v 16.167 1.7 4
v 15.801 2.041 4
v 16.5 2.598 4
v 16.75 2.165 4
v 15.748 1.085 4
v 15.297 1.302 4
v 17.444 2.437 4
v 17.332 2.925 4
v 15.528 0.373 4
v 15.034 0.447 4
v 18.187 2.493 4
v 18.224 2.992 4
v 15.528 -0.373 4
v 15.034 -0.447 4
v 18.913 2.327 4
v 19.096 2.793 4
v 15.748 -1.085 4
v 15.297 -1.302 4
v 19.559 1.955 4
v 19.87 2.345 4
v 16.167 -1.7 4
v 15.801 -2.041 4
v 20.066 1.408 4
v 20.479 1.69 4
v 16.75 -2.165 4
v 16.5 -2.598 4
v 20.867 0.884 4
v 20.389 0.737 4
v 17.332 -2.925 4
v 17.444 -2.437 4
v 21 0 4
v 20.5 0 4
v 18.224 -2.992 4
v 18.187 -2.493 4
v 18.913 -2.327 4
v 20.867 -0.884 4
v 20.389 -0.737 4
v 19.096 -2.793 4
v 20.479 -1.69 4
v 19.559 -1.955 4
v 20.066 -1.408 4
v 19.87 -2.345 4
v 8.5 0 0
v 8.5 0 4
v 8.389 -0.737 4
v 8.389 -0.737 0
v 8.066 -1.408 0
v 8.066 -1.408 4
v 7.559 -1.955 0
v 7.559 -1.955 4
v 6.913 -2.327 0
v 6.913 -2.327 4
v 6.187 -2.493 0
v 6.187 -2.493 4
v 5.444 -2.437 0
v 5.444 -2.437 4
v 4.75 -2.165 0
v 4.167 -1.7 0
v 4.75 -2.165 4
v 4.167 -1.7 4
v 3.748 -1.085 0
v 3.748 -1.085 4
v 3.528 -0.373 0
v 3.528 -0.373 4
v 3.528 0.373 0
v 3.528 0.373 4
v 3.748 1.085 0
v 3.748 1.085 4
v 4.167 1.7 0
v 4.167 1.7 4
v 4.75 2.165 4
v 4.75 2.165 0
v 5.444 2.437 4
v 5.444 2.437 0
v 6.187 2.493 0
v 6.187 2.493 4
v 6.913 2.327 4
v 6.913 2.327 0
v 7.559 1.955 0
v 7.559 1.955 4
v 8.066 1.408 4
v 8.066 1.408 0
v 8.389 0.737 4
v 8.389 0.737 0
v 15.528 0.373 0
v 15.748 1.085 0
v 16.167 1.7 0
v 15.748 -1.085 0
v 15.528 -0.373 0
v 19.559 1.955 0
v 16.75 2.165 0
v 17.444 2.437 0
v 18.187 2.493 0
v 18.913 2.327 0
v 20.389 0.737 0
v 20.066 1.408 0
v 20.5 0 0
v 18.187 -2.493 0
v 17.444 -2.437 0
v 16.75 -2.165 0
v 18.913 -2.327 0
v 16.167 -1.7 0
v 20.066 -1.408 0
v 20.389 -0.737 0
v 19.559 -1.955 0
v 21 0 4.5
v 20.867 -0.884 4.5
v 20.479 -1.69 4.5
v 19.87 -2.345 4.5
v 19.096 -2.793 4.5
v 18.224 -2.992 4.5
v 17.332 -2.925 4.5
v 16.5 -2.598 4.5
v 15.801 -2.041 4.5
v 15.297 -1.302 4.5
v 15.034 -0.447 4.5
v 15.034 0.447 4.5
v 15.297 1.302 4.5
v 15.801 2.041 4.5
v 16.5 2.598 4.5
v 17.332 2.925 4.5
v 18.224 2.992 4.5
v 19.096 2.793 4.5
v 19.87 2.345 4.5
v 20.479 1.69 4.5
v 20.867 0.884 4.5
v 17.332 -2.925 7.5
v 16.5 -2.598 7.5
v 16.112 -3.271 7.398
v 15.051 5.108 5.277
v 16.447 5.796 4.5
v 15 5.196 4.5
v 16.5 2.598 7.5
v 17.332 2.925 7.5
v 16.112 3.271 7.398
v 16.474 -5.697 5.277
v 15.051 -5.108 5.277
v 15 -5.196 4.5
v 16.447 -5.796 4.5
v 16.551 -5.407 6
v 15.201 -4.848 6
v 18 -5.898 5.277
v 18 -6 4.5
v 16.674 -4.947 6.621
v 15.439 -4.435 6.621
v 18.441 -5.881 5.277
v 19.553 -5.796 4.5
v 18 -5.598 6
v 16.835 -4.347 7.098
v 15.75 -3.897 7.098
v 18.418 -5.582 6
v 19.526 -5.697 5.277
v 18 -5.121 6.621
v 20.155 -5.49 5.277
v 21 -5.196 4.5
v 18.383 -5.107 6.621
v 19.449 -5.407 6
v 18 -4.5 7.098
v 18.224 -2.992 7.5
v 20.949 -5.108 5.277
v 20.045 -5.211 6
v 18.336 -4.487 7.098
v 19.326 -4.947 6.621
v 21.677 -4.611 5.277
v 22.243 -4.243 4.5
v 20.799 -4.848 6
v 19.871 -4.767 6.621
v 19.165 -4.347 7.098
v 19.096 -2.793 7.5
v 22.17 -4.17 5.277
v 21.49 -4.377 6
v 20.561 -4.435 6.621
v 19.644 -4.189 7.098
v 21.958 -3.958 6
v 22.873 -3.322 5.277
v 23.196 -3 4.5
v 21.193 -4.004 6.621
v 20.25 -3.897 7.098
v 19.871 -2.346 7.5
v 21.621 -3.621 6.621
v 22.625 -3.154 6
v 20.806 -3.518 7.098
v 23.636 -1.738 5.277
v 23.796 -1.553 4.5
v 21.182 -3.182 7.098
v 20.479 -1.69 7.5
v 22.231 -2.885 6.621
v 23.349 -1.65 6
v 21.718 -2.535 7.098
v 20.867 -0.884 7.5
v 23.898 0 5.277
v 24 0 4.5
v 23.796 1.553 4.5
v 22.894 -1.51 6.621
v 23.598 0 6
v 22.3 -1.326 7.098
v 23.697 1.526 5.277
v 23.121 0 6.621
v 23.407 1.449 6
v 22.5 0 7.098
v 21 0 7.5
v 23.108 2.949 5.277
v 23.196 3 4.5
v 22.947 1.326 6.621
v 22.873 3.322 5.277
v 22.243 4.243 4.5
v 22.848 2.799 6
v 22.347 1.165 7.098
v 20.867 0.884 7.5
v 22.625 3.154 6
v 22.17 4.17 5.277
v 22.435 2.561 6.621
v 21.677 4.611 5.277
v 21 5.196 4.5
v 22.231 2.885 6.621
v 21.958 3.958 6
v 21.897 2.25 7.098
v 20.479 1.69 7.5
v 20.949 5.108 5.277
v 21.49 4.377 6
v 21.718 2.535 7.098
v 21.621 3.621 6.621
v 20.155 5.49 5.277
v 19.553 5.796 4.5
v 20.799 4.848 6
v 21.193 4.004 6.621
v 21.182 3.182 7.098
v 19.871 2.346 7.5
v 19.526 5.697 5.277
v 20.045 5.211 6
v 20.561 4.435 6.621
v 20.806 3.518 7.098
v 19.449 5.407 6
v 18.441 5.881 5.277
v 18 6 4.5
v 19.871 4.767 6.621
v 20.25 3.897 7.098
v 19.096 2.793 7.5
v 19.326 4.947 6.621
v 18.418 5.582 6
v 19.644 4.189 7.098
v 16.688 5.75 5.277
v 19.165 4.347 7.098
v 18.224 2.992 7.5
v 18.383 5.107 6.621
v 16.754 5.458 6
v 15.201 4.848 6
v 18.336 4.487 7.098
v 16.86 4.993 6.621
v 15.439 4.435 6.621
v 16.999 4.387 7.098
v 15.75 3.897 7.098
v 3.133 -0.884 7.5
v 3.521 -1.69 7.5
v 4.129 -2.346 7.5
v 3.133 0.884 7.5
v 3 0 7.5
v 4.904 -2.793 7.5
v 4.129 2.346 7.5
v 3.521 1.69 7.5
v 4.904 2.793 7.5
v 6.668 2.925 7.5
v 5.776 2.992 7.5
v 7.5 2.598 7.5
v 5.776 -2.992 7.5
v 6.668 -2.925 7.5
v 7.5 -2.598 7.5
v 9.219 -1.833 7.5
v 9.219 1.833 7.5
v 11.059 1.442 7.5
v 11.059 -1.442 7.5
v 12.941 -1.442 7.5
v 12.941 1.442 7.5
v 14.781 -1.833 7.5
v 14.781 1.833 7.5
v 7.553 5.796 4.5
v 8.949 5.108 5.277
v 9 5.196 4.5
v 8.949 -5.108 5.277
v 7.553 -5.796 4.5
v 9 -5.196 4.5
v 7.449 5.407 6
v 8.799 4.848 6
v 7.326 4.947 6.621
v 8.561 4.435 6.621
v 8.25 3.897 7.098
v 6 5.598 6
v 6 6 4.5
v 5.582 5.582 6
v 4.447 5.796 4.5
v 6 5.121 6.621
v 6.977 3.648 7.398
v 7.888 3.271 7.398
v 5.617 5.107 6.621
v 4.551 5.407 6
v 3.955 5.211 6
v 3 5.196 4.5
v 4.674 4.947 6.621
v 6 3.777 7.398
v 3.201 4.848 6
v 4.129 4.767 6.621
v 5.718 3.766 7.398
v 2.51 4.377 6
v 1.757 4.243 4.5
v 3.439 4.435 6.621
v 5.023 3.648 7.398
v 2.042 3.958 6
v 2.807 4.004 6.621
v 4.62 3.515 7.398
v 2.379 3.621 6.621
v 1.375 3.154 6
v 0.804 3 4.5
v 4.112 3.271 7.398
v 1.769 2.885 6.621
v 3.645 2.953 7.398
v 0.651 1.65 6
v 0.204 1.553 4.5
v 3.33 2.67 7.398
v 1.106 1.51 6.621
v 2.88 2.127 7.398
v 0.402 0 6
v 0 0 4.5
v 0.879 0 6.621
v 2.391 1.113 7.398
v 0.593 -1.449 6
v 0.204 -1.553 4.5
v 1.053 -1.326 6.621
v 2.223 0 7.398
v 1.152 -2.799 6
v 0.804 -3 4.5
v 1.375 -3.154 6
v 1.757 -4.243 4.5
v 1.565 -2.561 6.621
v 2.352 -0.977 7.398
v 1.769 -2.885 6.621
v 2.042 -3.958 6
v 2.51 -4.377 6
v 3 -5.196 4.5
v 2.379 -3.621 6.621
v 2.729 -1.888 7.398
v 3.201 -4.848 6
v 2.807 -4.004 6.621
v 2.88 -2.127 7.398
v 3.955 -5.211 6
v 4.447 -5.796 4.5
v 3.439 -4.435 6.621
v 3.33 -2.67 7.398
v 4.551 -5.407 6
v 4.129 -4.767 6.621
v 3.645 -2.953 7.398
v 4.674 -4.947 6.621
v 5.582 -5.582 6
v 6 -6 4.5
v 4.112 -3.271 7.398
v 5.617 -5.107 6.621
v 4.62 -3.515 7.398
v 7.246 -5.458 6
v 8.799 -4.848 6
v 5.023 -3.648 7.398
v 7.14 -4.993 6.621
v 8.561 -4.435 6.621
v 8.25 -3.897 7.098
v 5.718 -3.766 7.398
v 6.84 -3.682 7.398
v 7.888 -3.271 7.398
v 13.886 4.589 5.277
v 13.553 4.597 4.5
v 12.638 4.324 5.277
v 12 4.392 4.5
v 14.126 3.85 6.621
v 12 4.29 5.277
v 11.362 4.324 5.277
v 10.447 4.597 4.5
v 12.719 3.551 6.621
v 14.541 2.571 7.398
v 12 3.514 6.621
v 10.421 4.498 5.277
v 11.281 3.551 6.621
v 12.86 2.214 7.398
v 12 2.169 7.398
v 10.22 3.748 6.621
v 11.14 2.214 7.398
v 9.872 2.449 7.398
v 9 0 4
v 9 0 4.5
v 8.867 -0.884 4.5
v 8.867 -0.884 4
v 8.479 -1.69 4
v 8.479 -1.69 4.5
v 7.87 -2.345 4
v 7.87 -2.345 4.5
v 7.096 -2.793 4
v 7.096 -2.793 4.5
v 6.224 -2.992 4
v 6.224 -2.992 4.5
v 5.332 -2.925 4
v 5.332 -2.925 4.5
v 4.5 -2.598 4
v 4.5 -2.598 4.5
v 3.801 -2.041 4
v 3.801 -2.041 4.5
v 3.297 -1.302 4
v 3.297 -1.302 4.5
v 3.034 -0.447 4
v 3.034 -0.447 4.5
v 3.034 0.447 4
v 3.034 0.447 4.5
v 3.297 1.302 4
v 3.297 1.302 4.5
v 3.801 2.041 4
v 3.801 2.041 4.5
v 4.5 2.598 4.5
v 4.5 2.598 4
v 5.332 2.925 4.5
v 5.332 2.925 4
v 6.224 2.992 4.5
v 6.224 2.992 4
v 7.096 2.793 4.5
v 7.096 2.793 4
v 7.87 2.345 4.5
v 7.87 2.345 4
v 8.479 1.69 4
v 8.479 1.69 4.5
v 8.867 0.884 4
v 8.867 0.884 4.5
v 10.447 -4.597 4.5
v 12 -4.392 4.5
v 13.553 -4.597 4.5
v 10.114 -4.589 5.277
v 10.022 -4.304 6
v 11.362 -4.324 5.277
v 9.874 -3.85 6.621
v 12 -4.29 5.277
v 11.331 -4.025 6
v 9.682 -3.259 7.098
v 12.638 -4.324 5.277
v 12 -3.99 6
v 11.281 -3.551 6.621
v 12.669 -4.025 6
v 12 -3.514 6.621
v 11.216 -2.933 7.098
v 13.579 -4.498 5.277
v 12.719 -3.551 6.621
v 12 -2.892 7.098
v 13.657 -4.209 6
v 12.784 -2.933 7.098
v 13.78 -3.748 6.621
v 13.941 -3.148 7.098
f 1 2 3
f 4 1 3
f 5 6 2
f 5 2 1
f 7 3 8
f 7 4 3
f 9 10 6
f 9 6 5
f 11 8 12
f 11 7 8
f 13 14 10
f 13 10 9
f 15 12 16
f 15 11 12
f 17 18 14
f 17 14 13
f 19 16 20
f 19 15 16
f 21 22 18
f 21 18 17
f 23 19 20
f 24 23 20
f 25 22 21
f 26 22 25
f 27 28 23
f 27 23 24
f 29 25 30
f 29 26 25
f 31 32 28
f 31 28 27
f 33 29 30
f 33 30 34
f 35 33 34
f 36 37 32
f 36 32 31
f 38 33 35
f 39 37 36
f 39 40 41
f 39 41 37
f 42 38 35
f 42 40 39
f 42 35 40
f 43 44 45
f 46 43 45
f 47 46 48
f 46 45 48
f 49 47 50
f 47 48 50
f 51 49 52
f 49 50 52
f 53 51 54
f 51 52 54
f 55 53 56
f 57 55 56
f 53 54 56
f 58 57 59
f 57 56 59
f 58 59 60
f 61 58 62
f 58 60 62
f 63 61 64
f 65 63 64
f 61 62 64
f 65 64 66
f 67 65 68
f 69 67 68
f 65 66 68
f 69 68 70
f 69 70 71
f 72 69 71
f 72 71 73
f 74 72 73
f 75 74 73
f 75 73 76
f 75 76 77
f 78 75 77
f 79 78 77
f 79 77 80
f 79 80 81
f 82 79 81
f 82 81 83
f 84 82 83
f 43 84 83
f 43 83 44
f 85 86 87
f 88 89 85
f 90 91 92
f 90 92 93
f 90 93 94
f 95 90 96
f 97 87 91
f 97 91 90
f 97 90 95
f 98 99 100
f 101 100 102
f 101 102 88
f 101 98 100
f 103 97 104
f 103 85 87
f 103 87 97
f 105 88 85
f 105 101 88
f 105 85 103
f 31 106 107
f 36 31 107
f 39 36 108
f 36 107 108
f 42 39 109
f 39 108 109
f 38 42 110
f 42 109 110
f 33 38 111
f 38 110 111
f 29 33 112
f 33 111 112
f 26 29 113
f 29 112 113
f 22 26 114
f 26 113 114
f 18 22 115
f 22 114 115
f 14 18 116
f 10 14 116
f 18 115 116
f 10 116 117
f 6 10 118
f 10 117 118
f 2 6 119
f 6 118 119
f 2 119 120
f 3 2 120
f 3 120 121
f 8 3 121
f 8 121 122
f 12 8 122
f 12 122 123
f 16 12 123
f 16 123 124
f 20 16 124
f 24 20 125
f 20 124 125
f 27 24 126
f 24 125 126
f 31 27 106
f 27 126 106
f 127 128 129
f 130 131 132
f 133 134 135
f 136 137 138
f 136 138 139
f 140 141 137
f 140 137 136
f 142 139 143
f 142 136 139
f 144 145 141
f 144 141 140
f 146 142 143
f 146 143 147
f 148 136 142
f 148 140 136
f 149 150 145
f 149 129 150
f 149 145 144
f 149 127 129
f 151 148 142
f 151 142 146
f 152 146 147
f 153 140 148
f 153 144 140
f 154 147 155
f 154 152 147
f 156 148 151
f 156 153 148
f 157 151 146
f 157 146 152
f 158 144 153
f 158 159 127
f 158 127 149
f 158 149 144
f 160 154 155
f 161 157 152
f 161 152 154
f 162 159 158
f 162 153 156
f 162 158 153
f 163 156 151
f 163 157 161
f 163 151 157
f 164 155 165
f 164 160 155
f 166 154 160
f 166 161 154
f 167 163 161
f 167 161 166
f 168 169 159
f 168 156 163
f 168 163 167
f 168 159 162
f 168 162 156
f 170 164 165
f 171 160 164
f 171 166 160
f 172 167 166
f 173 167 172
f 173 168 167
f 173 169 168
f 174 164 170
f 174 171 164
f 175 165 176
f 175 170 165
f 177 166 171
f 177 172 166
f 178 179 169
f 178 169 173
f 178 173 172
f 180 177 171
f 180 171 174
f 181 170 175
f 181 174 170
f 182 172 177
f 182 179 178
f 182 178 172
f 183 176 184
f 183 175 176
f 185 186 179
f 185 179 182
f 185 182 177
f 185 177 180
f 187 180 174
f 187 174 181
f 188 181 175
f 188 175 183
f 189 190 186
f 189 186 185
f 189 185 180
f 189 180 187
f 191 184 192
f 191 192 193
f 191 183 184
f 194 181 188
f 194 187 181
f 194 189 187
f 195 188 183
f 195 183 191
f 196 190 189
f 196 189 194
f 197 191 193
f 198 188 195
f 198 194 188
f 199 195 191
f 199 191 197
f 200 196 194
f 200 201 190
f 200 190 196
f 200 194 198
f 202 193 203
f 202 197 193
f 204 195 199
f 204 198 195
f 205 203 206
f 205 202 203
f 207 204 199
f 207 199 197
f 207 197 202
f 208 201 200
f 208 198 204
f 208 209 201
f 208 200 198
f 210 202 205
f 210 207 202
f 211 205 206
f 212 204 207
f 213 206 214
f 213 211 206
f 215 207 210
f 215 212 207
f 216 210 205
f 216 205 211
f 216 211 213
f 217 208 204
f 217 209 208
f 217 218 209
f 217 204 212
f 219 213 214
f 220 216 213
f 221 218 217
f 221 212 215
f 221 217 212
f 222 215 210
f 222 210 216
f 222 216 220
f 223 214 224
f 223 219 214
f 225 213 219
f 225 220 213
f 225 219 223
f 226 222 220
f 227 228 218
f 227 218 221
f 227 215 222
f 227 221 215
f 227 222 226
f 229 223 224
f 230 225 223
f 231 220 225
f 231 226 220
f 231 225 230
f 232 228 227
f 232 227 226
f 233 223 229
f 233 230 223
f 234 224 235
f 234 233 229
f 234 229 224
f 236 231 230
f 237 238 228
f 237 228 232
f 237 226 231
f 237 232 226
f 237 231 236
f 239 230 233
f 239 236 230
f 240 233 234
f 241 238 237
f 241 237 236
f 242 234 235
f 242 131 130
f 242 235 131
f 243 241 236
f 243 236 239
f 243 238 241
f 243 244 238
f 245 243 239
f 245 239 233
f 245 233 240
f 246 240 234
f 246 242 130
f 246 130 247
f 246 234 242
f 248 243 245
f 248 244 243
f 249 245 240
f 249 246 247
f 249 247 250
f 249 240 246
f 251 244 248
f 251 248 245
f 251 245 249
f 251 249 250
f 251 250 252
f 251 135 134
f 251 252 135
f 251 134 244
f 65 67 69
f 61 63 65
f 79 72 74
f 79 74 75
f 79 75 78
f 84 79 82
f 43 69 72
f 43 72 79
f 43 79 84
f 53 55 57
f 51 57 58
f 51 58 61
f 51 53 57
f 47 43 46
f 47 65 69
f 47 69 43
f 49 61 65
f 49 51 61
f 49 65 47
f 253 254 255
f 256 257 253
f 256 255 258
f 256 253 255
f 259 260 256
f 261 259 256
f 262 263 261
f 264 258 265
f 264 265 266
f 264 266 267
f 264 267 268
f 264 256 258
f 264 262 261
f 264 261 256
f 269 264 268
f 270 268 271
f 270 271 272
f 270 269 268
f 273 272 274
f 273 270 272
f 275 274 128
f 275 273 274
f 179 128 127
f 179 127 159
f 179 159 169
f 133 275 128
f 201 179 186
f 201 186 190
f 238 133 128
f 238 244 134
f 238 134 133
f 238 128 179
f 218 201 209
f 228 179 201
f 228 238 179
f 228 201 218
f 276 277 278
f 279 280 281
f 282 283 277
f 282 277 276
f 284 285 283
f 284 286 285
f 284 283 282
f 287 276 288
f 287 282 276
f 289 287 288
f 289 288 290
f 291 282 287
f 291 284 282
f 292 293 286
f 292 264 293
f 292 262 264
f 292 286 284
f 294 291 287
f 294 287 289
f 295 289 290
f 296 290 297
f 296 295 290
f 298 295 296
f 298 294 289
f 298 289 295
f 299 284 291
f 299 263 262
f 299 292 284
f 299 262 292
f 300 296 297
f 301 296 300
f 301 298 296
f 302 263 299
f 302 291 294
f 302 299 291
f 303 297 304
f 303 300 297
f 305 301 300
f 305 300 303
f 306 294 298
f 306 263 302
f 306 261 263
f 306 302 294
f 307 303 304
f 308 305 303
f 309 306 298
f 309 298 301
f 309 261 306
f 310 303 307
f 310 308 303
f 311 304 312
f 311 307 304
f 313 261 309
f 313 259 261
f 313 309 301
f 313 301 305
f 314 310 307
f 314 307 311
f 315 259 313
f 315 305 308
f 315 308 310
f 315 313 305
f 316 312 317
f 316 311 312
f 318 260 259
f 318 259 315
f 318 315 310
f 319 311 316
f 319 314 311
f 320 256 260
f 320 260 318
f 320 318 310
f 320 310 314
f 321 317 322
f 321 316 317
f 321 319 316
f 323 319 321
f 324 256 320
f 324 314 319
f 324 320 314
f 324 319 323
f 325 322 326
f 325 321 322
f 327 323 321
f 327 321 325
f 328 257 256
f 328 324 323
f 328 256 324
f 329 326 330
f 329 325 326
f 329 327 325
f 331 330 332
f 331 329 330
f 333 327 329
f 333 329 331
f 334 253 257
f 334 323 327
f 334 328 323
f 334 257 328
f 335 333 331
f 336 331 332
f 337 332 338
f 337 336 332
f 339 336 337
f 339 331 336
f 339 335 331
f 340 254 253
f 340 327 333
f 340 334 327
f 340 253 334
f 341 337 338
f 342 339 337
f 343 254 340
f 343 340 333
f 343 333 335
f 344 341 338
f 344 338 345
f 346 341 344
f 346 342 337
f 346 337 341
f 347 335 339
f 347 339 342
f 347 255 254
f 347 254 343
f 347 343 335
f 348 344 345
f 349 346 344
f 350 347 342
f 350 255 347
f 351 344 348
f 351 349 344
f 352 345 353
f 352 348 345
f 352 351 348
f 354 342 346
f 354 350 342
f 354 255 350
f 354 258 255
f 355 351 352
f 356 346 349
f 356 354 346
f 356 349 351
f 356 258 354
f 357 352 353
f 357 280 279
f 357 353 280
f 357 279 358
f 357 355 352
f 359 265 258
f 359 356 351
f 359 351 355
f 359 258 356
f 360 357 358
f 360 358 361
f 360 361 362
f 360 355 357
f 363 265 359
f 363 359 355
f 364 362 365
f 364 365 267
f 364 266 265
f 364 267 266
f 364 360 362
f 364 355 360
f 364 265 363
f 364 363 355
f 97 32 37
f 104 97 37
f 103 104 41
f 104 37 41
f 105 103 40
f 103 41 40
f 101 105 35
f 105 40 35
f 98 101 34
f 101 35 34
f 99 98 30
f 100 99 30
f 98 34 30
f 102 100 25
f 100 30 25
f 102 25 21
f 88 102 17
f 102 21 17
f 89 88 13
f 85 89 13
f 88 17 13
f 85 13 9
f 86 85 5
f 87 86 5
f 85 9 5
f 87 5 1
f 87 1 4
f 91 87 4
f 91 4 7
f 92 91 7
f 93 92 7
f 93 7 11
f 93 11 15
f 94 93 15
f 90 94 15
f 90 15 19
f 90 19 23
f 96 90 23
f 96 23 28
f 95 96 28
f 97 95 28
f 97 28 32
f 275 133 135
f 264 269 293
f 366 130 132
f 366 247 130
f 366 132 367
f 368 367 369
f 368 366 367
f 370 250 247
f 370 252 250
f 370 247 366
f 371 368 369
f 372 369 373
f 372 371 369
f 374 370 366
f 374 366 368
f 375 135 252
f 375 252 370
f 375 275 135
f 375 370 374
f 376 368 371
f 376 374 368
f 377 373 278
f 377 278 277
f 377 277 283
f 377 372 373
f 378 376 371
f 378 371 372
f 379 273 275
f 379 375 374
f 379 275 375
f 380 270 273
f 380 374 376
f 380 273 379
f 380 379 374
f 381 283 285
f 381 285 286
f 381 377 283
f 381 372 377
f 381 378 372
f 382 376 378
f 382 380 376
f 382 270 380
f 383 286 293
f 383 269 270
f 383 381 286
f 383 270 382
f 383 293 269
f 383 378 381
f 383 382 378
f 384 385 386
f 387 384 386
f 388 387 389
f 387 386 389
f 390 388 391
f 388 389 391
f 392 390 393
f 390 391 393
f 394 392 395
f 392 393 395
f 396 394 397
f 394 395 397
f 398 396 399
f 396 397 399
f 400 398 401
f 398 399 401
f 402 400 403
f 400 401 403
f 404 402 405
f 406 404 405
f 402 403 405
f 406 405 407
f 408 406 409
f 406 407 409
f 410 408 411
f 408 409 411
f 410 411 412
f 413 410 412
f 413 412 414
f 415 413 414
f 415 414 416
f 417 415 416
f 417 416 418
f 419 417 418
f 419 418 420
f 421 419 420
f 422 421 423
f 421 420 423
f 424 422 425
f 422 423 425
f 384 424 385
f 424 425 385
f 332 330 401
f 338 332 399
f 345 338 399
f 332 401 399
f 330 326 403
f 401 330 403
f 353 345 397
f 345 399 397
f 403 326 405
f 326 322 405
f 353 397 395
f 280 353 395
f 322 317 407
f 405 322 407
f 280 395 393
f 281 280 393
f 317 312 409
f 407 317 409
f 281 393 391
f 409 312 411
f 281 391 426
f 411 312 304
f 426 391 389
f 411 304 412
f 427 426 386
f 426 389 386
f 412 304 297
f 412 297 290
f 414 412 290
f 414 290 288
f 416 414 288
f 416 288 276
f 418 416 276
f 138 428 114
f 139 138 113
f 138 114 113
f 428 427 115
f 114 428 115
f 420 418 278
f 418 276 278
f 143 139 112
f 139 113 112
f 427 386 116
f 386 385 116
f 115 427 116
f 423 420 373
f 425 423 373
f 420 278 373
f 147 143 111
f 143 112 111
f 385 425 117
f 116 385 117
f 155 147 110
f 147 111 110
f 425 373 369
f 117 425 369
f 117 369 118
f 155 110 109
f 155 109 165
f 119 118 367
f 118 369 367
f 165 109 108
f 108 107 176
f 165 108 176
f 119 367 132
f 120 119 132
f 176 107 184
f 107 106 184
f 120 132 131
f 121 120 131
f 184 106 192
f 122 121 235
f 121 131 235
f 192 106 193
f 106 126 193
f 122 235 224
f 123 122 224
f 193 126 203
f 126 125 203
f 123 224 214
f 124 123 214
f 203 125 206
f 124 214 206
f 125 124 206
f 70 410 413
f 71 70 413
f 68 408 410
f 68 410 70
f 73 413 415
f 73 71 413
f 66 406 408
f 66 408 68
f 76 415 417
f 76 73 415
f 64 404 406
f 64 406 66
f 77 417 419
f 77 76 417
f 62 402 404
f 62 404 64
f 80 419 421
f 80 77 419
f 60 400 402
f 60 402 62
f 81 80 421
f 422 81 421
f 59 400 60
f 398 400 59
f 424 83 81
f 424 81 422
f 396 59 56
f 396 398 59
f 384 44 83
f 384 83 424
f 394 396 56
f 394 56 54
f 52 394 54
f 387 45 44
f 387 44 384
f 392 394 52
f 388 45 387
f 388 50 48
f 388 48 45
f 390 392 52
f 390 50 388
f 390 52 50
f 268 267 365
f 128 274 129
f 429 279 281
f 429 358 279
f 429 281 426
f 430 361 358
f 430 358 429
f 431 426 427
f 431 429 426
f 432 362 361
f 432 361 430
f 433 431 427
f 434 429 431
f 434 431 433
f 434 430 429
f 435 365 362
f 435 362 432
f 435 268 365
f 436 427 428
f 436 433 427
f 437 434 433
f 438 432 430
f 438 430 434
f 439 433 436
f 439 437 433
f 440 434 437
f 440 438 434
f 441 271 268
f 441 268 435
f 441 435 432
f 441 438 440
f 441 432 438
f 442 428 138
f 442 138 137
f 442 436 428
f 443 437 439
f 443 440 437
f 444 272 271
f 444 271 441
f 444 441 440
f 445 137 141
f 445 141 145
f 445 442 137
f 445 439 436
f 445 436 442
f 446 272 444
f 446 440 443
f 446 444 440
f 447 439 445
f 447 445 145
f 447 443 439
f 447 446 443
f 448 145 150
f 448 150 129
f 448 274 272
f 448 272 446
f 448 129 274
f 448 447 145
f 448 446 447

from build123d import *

# Parameters (mm, degrees)
EXTRUDE_START   = 4.5
EXTRUDE_1_DEPTH = 3
SKETCH_3_R      = 2.5
EXTRUDE_2_DEPTH = 4.5
SKETCH_6_R      = 3
EXTRUDE_3_DEPTH = 0.5
FILLET_1_R      = 3


with BuildPart() as part:
    # Эскиз2 → Бобышка-Вытянуть1 (new body)
    with BuildSketch(Plane.XY.offset(EXTRUDE_START)):
        with BuildLine():
            ThreePointArc((9, 5.196152423), (0, 0), (9, -5.196152423))
            ThreePointArc((9, -5.196152423), (12, -4.392304845), (15, -5.196152423))
            ThreePointArc((15, -5.196152423), (24, 0), (15, 5.196152423))
            ThreePointArc((15, 5.196152423), (12, 4.392304845), (9, 5.196152423))
        make_face()
    extrude(amount=EXTRUDE_1_DEPTH)

    # Эскиз3 → Бобышка-Вытянуть2 (add)
    with BuildSketch(Plane(origin=(0, 0, 4.5), x_dir=(-1, 0, 0), z_dir=(0, 0, -1))):
        with Locations(Location((-18, 0, 0), (0, 0, 180))):
            Circle(SKETCH_3_R)
        with Locations(Location((-6, 0, 0), (0, 0, 180))):
            Circle(SKETCH_3_R)
    extrude(amount=EXTRUDE_2_DEPTH)

    # Эскиз6 → Бобышка-Вытянуть3 (add)
    with BuildSketch(Plane(origin=(0, 0, 4.5), x_dir=(-1, 0, 0), z_dir=(0, 0, -1))):
        with Locations(Location((-18, 0, 0), (0, 0, 180))):
            Circle(SKETCH_6_R)
        with Locations(Location((-6, 0, 0), (0, 0, 180))):
            Circle(SKETCH_6_R)
    extrude(amount=EXTRUDE_3_DEPTH)

    # Скругление1
    fillet_1_edges = [part.edges().sort_by_distance(p)[0] for p in [
        (0, 0, 7.5),
        (12, 4.392304845, 7.5),
        (24, 0, 7.5),
        (12, -4.392304845, 7.5),
    ]]
    fillet(fillet_1_edges, radius=FILLET_1_R - 0.0001)  # a hair under: the kernel refuses the full size


solid = part.part
